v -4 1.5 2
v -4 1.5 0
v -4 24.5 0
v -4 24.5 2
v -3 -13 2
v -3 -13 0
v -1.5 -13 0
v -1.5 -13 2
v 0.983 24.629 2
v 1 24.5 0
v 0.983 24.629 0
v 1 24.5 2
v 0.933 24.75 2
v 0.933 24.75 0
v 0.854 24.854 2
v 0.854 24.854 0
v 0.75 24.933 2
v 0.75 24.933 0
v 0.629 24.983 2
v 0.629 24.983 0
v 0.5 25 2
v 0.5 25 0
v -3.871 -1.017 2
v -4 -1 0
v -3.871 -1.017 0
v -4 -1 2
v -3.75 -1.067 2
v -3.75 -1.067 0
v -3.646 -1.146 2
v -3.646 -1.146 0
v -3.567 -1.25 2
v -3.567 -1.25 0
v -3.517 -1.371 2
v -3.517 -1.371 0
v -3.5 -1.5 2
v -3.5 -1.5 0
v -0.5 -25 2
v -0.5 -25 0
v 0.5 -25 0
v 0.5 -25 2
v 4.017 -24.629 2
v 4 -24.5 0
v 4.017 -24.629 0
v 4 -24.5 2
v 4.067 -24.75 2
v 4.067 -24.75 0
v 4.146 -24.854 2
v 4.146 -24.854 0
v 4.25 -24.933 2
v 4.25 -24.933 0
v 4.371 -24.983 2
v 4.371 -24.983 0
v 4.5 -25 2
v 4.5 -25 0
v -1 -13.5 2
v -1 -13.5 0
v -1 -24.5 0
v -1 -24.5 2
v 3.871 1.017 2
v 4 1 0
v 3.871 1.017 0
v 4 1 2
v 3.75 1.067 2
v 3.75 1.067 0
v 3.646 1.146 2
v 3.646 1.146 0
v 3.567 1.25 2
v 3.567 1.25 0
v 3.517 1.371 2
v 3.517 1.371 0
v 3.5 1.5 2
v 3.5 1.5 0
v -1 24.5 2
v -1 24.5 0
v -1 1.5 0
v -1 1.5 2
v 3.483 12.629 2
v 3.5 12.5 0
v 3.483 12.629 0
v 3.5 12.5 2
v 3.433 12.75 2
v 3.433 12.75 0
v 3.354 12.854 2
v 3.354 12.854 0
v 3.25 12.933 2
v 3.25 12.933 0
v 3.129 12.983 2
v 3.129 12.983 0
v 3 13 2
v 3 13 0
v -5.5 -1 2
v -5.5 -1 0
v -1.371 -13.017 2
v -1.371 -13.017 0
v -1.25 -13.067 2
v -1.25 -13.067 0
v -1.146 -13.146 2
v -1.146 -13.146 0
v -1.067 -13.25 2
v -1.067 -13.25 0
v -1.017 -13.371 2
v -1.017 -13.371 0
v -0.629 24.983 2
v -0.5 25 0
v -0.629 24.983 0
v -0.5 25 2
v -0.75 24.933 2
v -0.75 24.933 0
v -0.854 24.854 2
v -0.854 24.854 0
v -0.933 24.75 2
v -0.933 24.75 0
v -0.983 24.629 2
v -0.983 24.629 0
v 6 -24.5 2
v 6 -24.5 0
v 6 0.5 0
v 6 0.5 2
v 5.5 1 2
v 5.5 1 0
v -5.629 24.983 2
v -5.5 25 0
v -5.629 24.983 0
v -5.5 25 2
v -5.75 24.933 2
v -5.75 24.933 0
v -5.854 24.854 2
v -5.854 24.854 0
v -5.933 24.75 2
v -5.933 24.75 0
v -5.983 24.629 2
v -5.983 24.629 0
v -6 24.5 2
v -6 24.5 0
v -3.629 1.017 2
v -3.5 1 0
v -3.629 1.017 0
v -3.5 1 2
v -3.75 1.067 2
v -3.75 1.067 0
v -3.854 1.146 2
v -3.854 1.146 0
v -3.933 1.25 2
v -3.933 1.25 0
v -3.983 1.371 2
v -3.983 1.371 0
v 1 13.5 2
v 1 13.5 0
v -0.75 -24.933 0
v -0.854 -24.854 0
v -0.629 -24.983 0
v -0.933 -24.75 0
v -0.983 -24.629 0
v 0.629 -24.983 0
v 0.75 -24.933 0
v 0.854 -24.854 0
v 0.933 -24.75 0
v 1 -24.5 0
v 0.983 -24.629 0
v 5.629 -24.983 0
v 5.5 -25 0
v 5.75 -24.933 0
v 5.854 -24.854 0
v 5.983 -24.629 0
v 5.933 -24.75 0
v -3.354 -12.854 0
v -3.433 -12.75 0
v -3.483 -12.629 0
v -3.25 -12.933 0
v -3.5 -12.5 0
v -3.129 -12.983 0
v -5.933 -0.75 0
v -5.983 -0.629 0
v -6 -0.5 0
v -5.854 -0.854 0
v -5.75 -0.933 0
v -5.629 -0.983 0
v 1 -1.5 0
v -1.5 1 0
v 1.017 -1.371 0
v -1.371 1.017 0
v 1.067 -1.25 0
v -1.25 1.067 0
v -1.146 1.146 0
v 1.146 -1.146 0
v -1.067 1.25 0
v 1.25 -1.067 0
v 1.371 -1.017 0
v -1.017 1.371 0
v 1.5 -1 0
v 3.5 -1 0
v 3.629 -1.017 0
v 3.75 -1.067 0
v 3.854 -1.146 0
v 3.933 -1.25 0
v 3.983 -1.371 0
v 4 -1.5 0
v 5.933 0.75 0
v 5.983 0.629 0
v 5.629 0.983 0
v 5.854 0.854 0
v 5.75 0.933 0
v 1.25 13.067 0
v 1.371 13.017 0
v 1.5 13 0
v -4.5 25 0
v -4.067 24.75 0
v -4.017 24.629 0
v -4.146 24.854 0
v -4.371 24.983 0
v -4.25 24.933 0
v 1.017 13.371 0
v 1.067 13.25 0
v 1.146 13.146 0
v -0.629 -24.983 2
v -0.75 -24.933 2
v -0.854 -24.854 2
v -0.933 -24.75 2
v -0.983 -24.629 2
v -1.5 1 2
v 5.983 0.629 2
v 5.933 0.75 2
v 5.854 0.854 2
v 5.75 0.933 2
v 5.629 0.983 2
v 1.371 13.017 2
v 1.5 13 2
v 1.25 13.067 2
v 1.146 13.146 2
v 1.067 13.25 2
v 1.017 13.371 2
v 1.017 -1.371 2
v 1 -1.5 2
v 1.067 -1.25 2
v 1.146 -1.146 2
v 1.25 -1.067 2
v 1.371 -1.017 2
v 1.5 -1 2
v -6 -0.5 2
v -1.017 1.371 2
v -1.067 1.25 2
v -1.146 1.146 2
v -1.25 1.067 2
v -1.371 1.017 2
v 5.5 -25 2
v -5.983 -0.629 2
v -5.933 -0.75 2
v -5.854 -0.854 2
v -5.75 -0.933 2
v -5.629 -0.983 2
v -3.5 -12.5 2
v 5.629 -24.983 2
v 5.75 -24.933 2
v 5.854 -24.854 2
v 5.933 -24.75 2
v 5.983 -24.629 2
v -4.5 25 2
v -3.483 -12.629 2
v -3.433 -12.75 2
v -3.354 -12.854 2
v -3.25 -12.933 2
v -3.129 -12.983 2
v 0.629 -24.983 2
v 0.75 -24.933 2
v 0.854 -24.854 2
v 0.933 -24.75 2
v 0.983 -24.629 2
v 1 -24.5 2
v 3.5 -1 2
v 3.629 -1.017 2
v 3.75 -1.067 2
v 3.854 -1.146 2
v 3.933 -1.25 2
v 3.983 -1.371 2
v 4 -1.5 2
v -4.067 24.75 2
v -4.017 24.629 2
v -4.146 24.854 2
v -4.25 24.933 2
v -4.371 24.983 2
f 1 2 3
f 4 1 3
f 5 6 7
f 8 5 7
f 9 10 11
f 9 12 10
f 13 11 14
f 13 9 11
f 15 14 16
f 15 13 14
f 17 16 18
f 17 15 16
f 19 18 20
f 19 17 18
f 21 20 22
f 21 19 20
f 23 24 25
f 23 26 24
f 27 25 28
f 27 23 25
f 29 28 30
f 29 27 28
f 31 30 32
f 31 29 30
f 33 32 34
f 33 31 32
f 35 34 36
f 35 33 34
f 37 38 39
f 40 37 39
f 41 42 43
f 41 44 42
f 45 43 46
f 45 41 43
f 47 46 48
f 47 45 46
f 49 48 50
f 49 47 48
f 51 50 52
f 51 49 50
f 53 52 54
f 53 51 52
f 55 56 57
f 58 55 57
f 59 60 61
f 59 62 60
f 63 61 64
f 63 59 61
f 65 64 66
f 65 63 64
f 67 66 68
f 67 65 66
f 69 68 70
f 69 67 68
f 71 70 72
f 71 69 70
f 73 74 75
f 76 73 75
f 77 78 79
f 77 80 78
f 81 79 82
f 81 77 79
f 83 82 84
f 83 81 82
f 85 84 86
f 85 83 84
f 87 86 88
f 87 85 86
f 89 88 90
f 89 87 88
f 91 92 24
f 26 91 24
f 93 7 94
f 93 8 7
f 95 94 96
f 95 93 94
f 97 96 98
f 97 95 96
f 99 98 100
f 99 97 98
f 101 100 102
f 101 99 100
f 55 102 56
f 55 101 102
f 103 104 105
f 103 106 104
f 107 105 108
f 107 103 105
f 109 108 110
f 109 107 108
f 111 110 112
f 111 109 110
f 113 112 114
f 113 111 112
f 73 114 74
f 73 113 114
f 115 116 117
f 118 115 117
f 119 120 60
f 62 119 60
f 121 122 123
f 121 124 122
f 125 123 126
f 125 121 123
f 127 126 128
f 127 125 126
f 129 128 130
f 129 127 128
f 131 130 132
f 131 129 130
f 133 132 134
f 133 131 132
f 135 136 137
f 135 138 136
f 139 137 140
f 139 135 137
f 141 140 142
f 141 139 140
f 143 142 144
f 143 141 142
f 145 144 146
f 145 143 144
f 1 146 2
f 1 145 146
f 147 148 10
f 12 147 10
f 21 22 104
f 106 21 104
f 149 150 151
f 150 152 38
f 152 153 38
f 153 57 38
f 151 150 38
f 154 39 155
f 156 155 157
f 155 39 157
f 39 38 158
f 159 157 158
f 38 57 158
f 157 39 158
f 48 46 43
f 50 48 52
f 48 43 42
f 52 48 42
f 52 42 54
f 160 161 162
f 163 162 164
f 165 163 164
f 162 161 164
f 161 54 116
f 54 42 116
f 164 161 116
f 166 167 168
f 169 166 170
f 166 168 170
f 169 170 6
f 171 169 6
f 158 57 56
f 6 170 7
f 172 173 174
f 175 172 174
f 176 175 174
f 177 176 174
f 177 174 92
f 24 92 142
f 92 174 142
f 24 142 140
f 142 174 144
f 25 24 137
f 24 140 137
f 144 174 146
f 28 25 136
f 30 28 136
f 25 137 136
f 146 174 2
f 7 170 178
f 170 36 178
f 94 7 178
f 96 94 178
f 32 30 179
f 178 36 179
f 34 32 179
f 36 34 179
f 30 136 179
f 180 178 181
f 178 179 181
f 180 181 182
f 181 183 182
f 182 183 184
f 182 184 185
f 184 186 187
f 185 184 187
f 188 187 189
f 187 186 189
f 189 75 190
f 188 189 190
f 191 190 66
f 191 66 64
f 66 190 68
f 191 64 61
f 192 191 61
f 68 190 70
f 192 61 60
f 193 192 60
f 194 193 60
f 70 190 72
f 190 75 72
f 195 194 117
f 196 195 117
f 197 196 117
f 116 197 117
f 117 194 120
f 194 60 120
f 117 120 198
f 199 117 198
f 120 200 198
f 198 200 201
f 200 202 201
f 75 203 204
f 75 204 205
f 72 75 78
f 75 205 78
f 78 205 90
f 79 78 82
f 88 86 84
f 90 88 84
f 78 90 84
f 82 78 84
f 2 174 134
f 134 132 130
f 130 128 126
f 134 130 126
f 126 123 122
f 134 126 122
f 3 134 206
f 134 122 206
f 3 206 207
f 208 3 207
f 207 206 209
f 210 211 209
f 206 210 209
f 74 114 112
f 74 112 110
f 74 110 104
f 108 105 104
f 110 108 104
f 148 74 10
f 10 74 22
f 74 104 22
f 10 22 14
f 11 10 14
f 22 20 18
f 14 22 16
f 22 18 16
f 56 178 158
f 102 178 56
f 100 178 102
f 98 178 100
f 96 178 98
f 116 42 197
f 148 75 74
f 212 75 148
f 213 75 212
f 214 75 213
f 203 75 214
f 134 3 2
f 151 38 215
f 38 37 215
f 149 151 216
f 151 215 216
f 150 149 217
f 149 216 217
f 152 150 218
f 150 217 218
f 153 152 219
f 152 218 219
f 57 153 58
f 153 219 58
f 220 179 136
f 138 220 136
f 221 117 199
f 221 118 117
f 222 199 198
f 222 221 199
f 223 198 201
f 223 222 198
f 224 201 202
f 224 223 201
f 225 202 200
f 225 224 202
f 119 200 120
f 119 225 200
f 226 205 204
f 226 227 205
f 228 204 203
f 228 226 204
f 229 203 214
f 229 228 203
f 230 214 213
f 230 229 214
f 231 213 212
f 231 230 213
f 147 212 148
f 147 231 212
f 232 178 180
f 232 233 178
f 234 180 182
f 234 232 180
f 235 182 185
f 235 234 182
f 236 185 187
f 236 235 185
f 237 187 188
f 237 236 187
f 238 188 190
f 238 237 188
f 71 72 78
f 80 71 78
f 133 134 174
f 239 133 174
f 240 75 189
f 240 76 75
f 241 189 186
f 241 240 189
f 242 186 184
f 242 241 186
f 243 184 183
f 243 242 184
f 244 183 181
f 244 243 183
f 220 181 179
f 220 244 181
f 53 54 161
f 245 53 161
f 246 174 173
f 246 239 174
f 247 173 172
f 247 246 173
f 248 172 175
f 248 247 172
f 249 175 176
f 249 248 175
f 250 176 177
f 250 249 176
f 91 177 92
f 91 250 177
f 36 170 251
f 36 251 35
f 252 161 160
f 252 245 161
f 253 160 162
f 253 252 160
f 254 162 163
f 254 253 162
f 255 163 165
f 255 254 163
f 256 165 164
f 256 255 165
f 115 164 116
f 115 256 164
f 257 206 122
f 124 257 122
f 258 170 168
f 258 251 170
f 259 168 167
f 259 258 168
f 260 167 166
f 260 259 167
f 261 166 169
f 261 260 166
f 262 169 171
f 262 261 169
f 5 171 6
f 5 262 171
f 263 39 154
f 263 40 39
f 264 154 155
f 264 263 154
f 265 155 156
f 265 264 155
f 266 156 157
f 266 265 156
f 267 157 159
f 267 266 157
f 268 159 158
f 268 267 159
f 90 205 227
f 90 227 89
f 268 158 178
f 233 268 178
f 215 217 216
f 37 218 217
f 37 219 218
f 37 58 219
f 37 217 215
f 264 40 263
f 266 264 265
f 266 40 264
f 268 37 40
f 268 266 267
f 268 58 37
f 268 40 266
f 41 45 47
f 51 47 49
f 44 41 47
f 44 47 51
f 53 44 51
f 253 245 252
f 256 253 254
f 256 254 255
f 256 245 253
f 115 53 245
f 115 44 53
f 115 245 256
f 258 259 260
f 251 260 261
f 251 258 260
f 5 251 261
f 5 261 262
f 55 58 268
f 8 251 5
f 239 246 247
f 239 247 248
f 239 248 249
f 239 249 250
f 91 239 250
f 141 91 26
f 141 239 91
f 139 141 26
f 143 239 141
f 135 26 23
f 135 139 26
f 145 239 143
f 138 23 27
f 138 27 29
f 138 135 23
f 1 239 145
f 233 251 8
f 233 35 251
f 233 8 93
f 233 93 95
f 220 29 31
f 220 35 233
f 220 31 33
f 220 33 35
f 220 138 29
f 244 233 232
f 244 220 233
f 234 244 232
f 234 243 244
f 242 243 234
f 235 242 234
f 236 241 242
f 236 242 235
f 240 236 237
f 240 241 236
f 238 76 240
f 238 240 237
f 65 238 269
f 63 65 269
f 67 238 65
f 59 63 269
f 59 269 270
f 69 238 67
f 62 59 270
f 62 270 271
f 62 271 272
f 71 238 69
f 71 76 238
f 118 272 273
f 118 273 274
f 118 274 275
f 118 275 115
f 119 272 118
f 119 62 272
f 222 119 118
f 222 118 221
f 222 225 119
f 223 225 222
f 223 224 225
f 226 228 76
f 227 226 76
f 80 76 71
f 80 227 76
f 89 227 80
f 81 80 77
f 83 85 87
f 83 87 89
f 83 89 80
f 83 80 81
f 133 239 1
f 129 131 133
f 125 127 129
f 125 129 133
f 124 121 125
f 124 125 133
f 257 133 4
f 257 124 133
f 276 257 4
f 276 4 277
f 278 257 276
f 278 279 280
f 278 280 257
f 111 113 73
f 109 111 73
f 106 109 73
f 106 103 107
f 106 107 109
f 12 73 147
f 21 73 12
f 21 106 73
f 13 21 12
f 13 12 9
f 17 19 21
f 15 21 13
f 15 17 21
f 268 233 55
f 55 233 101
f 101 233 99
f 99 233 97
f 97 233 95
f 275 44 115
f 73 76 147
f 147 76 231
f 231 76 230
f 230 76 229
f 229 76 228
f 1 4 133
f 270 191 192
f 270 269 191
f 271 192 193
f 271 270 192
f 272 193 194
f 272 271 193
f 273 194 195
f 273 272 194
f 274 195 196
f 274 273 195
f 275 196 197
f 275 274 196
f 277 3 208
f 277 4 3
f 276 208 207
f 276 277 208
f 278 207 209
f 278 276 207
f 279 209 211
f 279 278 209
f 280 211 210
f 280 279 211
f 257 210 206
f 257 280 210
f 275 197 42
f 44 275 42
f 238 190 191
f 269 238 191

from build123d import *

# Parameters (mm, degrees)
F0_W     = 2.5
F0_H     = 12
F1_DEPTH = 2
F2_R     = 0.5


with BuildPart() as f1:
    # F0 (on Top) → F1 (new body)
    with BuildSketch(Plane.XY):
        Polygon((-1, -13), (-1, -25), (1, -25), (1, -1), (1, 1), (1, 13), (1, 25), (-1, 25), (-1, 1), (-1, -1), align=None)
        with Locations((-2.25, -7)):
            Rectangle(F0_W, F0_H)
        Polygon((1, 1), (1, -1), (4, -1), (4, -25), (6, -25), (6, 1), (3.5, 1), align=None)
        Polygon((-3.5, -1), (-1, -1), (-1, 1), (-4, 1), (-4, 25), (-6, 25), (-6, -1), align=None)
        with Locations((2.25, 7)):
            Rectangle(F0_W, F0_H)
    extrude(amount=F1_DEPTH)

    # F2
    f2_edges = [f1.edges().sort_by_distance(p)[0] for p in [
        (-1, -25, 1),
        (-1, 1, 1),
        (-6, -1, 1),
        (1, -25, 1),
        (4, -25, 1),
        (6, -25, 1),
        (1, -1, 1),
        (4, -1, 1),
        (6, 1, 1),
        (-4, 1, 1),
        (-6, 25, 1),
        (-4, 25, 1),
        (-1, 25, 1),
        (1, 25, 1),
        (3.5, 13, 1),
        (-3.5, -13, 1),
        (-3.5, -1, 1),
        (3.5, 1, 1),
        (-1, -13, 1),
        (1, 13, 1),
    ]]
    fillet(f2_edges, radius=F2_R)


solid = f1.part
